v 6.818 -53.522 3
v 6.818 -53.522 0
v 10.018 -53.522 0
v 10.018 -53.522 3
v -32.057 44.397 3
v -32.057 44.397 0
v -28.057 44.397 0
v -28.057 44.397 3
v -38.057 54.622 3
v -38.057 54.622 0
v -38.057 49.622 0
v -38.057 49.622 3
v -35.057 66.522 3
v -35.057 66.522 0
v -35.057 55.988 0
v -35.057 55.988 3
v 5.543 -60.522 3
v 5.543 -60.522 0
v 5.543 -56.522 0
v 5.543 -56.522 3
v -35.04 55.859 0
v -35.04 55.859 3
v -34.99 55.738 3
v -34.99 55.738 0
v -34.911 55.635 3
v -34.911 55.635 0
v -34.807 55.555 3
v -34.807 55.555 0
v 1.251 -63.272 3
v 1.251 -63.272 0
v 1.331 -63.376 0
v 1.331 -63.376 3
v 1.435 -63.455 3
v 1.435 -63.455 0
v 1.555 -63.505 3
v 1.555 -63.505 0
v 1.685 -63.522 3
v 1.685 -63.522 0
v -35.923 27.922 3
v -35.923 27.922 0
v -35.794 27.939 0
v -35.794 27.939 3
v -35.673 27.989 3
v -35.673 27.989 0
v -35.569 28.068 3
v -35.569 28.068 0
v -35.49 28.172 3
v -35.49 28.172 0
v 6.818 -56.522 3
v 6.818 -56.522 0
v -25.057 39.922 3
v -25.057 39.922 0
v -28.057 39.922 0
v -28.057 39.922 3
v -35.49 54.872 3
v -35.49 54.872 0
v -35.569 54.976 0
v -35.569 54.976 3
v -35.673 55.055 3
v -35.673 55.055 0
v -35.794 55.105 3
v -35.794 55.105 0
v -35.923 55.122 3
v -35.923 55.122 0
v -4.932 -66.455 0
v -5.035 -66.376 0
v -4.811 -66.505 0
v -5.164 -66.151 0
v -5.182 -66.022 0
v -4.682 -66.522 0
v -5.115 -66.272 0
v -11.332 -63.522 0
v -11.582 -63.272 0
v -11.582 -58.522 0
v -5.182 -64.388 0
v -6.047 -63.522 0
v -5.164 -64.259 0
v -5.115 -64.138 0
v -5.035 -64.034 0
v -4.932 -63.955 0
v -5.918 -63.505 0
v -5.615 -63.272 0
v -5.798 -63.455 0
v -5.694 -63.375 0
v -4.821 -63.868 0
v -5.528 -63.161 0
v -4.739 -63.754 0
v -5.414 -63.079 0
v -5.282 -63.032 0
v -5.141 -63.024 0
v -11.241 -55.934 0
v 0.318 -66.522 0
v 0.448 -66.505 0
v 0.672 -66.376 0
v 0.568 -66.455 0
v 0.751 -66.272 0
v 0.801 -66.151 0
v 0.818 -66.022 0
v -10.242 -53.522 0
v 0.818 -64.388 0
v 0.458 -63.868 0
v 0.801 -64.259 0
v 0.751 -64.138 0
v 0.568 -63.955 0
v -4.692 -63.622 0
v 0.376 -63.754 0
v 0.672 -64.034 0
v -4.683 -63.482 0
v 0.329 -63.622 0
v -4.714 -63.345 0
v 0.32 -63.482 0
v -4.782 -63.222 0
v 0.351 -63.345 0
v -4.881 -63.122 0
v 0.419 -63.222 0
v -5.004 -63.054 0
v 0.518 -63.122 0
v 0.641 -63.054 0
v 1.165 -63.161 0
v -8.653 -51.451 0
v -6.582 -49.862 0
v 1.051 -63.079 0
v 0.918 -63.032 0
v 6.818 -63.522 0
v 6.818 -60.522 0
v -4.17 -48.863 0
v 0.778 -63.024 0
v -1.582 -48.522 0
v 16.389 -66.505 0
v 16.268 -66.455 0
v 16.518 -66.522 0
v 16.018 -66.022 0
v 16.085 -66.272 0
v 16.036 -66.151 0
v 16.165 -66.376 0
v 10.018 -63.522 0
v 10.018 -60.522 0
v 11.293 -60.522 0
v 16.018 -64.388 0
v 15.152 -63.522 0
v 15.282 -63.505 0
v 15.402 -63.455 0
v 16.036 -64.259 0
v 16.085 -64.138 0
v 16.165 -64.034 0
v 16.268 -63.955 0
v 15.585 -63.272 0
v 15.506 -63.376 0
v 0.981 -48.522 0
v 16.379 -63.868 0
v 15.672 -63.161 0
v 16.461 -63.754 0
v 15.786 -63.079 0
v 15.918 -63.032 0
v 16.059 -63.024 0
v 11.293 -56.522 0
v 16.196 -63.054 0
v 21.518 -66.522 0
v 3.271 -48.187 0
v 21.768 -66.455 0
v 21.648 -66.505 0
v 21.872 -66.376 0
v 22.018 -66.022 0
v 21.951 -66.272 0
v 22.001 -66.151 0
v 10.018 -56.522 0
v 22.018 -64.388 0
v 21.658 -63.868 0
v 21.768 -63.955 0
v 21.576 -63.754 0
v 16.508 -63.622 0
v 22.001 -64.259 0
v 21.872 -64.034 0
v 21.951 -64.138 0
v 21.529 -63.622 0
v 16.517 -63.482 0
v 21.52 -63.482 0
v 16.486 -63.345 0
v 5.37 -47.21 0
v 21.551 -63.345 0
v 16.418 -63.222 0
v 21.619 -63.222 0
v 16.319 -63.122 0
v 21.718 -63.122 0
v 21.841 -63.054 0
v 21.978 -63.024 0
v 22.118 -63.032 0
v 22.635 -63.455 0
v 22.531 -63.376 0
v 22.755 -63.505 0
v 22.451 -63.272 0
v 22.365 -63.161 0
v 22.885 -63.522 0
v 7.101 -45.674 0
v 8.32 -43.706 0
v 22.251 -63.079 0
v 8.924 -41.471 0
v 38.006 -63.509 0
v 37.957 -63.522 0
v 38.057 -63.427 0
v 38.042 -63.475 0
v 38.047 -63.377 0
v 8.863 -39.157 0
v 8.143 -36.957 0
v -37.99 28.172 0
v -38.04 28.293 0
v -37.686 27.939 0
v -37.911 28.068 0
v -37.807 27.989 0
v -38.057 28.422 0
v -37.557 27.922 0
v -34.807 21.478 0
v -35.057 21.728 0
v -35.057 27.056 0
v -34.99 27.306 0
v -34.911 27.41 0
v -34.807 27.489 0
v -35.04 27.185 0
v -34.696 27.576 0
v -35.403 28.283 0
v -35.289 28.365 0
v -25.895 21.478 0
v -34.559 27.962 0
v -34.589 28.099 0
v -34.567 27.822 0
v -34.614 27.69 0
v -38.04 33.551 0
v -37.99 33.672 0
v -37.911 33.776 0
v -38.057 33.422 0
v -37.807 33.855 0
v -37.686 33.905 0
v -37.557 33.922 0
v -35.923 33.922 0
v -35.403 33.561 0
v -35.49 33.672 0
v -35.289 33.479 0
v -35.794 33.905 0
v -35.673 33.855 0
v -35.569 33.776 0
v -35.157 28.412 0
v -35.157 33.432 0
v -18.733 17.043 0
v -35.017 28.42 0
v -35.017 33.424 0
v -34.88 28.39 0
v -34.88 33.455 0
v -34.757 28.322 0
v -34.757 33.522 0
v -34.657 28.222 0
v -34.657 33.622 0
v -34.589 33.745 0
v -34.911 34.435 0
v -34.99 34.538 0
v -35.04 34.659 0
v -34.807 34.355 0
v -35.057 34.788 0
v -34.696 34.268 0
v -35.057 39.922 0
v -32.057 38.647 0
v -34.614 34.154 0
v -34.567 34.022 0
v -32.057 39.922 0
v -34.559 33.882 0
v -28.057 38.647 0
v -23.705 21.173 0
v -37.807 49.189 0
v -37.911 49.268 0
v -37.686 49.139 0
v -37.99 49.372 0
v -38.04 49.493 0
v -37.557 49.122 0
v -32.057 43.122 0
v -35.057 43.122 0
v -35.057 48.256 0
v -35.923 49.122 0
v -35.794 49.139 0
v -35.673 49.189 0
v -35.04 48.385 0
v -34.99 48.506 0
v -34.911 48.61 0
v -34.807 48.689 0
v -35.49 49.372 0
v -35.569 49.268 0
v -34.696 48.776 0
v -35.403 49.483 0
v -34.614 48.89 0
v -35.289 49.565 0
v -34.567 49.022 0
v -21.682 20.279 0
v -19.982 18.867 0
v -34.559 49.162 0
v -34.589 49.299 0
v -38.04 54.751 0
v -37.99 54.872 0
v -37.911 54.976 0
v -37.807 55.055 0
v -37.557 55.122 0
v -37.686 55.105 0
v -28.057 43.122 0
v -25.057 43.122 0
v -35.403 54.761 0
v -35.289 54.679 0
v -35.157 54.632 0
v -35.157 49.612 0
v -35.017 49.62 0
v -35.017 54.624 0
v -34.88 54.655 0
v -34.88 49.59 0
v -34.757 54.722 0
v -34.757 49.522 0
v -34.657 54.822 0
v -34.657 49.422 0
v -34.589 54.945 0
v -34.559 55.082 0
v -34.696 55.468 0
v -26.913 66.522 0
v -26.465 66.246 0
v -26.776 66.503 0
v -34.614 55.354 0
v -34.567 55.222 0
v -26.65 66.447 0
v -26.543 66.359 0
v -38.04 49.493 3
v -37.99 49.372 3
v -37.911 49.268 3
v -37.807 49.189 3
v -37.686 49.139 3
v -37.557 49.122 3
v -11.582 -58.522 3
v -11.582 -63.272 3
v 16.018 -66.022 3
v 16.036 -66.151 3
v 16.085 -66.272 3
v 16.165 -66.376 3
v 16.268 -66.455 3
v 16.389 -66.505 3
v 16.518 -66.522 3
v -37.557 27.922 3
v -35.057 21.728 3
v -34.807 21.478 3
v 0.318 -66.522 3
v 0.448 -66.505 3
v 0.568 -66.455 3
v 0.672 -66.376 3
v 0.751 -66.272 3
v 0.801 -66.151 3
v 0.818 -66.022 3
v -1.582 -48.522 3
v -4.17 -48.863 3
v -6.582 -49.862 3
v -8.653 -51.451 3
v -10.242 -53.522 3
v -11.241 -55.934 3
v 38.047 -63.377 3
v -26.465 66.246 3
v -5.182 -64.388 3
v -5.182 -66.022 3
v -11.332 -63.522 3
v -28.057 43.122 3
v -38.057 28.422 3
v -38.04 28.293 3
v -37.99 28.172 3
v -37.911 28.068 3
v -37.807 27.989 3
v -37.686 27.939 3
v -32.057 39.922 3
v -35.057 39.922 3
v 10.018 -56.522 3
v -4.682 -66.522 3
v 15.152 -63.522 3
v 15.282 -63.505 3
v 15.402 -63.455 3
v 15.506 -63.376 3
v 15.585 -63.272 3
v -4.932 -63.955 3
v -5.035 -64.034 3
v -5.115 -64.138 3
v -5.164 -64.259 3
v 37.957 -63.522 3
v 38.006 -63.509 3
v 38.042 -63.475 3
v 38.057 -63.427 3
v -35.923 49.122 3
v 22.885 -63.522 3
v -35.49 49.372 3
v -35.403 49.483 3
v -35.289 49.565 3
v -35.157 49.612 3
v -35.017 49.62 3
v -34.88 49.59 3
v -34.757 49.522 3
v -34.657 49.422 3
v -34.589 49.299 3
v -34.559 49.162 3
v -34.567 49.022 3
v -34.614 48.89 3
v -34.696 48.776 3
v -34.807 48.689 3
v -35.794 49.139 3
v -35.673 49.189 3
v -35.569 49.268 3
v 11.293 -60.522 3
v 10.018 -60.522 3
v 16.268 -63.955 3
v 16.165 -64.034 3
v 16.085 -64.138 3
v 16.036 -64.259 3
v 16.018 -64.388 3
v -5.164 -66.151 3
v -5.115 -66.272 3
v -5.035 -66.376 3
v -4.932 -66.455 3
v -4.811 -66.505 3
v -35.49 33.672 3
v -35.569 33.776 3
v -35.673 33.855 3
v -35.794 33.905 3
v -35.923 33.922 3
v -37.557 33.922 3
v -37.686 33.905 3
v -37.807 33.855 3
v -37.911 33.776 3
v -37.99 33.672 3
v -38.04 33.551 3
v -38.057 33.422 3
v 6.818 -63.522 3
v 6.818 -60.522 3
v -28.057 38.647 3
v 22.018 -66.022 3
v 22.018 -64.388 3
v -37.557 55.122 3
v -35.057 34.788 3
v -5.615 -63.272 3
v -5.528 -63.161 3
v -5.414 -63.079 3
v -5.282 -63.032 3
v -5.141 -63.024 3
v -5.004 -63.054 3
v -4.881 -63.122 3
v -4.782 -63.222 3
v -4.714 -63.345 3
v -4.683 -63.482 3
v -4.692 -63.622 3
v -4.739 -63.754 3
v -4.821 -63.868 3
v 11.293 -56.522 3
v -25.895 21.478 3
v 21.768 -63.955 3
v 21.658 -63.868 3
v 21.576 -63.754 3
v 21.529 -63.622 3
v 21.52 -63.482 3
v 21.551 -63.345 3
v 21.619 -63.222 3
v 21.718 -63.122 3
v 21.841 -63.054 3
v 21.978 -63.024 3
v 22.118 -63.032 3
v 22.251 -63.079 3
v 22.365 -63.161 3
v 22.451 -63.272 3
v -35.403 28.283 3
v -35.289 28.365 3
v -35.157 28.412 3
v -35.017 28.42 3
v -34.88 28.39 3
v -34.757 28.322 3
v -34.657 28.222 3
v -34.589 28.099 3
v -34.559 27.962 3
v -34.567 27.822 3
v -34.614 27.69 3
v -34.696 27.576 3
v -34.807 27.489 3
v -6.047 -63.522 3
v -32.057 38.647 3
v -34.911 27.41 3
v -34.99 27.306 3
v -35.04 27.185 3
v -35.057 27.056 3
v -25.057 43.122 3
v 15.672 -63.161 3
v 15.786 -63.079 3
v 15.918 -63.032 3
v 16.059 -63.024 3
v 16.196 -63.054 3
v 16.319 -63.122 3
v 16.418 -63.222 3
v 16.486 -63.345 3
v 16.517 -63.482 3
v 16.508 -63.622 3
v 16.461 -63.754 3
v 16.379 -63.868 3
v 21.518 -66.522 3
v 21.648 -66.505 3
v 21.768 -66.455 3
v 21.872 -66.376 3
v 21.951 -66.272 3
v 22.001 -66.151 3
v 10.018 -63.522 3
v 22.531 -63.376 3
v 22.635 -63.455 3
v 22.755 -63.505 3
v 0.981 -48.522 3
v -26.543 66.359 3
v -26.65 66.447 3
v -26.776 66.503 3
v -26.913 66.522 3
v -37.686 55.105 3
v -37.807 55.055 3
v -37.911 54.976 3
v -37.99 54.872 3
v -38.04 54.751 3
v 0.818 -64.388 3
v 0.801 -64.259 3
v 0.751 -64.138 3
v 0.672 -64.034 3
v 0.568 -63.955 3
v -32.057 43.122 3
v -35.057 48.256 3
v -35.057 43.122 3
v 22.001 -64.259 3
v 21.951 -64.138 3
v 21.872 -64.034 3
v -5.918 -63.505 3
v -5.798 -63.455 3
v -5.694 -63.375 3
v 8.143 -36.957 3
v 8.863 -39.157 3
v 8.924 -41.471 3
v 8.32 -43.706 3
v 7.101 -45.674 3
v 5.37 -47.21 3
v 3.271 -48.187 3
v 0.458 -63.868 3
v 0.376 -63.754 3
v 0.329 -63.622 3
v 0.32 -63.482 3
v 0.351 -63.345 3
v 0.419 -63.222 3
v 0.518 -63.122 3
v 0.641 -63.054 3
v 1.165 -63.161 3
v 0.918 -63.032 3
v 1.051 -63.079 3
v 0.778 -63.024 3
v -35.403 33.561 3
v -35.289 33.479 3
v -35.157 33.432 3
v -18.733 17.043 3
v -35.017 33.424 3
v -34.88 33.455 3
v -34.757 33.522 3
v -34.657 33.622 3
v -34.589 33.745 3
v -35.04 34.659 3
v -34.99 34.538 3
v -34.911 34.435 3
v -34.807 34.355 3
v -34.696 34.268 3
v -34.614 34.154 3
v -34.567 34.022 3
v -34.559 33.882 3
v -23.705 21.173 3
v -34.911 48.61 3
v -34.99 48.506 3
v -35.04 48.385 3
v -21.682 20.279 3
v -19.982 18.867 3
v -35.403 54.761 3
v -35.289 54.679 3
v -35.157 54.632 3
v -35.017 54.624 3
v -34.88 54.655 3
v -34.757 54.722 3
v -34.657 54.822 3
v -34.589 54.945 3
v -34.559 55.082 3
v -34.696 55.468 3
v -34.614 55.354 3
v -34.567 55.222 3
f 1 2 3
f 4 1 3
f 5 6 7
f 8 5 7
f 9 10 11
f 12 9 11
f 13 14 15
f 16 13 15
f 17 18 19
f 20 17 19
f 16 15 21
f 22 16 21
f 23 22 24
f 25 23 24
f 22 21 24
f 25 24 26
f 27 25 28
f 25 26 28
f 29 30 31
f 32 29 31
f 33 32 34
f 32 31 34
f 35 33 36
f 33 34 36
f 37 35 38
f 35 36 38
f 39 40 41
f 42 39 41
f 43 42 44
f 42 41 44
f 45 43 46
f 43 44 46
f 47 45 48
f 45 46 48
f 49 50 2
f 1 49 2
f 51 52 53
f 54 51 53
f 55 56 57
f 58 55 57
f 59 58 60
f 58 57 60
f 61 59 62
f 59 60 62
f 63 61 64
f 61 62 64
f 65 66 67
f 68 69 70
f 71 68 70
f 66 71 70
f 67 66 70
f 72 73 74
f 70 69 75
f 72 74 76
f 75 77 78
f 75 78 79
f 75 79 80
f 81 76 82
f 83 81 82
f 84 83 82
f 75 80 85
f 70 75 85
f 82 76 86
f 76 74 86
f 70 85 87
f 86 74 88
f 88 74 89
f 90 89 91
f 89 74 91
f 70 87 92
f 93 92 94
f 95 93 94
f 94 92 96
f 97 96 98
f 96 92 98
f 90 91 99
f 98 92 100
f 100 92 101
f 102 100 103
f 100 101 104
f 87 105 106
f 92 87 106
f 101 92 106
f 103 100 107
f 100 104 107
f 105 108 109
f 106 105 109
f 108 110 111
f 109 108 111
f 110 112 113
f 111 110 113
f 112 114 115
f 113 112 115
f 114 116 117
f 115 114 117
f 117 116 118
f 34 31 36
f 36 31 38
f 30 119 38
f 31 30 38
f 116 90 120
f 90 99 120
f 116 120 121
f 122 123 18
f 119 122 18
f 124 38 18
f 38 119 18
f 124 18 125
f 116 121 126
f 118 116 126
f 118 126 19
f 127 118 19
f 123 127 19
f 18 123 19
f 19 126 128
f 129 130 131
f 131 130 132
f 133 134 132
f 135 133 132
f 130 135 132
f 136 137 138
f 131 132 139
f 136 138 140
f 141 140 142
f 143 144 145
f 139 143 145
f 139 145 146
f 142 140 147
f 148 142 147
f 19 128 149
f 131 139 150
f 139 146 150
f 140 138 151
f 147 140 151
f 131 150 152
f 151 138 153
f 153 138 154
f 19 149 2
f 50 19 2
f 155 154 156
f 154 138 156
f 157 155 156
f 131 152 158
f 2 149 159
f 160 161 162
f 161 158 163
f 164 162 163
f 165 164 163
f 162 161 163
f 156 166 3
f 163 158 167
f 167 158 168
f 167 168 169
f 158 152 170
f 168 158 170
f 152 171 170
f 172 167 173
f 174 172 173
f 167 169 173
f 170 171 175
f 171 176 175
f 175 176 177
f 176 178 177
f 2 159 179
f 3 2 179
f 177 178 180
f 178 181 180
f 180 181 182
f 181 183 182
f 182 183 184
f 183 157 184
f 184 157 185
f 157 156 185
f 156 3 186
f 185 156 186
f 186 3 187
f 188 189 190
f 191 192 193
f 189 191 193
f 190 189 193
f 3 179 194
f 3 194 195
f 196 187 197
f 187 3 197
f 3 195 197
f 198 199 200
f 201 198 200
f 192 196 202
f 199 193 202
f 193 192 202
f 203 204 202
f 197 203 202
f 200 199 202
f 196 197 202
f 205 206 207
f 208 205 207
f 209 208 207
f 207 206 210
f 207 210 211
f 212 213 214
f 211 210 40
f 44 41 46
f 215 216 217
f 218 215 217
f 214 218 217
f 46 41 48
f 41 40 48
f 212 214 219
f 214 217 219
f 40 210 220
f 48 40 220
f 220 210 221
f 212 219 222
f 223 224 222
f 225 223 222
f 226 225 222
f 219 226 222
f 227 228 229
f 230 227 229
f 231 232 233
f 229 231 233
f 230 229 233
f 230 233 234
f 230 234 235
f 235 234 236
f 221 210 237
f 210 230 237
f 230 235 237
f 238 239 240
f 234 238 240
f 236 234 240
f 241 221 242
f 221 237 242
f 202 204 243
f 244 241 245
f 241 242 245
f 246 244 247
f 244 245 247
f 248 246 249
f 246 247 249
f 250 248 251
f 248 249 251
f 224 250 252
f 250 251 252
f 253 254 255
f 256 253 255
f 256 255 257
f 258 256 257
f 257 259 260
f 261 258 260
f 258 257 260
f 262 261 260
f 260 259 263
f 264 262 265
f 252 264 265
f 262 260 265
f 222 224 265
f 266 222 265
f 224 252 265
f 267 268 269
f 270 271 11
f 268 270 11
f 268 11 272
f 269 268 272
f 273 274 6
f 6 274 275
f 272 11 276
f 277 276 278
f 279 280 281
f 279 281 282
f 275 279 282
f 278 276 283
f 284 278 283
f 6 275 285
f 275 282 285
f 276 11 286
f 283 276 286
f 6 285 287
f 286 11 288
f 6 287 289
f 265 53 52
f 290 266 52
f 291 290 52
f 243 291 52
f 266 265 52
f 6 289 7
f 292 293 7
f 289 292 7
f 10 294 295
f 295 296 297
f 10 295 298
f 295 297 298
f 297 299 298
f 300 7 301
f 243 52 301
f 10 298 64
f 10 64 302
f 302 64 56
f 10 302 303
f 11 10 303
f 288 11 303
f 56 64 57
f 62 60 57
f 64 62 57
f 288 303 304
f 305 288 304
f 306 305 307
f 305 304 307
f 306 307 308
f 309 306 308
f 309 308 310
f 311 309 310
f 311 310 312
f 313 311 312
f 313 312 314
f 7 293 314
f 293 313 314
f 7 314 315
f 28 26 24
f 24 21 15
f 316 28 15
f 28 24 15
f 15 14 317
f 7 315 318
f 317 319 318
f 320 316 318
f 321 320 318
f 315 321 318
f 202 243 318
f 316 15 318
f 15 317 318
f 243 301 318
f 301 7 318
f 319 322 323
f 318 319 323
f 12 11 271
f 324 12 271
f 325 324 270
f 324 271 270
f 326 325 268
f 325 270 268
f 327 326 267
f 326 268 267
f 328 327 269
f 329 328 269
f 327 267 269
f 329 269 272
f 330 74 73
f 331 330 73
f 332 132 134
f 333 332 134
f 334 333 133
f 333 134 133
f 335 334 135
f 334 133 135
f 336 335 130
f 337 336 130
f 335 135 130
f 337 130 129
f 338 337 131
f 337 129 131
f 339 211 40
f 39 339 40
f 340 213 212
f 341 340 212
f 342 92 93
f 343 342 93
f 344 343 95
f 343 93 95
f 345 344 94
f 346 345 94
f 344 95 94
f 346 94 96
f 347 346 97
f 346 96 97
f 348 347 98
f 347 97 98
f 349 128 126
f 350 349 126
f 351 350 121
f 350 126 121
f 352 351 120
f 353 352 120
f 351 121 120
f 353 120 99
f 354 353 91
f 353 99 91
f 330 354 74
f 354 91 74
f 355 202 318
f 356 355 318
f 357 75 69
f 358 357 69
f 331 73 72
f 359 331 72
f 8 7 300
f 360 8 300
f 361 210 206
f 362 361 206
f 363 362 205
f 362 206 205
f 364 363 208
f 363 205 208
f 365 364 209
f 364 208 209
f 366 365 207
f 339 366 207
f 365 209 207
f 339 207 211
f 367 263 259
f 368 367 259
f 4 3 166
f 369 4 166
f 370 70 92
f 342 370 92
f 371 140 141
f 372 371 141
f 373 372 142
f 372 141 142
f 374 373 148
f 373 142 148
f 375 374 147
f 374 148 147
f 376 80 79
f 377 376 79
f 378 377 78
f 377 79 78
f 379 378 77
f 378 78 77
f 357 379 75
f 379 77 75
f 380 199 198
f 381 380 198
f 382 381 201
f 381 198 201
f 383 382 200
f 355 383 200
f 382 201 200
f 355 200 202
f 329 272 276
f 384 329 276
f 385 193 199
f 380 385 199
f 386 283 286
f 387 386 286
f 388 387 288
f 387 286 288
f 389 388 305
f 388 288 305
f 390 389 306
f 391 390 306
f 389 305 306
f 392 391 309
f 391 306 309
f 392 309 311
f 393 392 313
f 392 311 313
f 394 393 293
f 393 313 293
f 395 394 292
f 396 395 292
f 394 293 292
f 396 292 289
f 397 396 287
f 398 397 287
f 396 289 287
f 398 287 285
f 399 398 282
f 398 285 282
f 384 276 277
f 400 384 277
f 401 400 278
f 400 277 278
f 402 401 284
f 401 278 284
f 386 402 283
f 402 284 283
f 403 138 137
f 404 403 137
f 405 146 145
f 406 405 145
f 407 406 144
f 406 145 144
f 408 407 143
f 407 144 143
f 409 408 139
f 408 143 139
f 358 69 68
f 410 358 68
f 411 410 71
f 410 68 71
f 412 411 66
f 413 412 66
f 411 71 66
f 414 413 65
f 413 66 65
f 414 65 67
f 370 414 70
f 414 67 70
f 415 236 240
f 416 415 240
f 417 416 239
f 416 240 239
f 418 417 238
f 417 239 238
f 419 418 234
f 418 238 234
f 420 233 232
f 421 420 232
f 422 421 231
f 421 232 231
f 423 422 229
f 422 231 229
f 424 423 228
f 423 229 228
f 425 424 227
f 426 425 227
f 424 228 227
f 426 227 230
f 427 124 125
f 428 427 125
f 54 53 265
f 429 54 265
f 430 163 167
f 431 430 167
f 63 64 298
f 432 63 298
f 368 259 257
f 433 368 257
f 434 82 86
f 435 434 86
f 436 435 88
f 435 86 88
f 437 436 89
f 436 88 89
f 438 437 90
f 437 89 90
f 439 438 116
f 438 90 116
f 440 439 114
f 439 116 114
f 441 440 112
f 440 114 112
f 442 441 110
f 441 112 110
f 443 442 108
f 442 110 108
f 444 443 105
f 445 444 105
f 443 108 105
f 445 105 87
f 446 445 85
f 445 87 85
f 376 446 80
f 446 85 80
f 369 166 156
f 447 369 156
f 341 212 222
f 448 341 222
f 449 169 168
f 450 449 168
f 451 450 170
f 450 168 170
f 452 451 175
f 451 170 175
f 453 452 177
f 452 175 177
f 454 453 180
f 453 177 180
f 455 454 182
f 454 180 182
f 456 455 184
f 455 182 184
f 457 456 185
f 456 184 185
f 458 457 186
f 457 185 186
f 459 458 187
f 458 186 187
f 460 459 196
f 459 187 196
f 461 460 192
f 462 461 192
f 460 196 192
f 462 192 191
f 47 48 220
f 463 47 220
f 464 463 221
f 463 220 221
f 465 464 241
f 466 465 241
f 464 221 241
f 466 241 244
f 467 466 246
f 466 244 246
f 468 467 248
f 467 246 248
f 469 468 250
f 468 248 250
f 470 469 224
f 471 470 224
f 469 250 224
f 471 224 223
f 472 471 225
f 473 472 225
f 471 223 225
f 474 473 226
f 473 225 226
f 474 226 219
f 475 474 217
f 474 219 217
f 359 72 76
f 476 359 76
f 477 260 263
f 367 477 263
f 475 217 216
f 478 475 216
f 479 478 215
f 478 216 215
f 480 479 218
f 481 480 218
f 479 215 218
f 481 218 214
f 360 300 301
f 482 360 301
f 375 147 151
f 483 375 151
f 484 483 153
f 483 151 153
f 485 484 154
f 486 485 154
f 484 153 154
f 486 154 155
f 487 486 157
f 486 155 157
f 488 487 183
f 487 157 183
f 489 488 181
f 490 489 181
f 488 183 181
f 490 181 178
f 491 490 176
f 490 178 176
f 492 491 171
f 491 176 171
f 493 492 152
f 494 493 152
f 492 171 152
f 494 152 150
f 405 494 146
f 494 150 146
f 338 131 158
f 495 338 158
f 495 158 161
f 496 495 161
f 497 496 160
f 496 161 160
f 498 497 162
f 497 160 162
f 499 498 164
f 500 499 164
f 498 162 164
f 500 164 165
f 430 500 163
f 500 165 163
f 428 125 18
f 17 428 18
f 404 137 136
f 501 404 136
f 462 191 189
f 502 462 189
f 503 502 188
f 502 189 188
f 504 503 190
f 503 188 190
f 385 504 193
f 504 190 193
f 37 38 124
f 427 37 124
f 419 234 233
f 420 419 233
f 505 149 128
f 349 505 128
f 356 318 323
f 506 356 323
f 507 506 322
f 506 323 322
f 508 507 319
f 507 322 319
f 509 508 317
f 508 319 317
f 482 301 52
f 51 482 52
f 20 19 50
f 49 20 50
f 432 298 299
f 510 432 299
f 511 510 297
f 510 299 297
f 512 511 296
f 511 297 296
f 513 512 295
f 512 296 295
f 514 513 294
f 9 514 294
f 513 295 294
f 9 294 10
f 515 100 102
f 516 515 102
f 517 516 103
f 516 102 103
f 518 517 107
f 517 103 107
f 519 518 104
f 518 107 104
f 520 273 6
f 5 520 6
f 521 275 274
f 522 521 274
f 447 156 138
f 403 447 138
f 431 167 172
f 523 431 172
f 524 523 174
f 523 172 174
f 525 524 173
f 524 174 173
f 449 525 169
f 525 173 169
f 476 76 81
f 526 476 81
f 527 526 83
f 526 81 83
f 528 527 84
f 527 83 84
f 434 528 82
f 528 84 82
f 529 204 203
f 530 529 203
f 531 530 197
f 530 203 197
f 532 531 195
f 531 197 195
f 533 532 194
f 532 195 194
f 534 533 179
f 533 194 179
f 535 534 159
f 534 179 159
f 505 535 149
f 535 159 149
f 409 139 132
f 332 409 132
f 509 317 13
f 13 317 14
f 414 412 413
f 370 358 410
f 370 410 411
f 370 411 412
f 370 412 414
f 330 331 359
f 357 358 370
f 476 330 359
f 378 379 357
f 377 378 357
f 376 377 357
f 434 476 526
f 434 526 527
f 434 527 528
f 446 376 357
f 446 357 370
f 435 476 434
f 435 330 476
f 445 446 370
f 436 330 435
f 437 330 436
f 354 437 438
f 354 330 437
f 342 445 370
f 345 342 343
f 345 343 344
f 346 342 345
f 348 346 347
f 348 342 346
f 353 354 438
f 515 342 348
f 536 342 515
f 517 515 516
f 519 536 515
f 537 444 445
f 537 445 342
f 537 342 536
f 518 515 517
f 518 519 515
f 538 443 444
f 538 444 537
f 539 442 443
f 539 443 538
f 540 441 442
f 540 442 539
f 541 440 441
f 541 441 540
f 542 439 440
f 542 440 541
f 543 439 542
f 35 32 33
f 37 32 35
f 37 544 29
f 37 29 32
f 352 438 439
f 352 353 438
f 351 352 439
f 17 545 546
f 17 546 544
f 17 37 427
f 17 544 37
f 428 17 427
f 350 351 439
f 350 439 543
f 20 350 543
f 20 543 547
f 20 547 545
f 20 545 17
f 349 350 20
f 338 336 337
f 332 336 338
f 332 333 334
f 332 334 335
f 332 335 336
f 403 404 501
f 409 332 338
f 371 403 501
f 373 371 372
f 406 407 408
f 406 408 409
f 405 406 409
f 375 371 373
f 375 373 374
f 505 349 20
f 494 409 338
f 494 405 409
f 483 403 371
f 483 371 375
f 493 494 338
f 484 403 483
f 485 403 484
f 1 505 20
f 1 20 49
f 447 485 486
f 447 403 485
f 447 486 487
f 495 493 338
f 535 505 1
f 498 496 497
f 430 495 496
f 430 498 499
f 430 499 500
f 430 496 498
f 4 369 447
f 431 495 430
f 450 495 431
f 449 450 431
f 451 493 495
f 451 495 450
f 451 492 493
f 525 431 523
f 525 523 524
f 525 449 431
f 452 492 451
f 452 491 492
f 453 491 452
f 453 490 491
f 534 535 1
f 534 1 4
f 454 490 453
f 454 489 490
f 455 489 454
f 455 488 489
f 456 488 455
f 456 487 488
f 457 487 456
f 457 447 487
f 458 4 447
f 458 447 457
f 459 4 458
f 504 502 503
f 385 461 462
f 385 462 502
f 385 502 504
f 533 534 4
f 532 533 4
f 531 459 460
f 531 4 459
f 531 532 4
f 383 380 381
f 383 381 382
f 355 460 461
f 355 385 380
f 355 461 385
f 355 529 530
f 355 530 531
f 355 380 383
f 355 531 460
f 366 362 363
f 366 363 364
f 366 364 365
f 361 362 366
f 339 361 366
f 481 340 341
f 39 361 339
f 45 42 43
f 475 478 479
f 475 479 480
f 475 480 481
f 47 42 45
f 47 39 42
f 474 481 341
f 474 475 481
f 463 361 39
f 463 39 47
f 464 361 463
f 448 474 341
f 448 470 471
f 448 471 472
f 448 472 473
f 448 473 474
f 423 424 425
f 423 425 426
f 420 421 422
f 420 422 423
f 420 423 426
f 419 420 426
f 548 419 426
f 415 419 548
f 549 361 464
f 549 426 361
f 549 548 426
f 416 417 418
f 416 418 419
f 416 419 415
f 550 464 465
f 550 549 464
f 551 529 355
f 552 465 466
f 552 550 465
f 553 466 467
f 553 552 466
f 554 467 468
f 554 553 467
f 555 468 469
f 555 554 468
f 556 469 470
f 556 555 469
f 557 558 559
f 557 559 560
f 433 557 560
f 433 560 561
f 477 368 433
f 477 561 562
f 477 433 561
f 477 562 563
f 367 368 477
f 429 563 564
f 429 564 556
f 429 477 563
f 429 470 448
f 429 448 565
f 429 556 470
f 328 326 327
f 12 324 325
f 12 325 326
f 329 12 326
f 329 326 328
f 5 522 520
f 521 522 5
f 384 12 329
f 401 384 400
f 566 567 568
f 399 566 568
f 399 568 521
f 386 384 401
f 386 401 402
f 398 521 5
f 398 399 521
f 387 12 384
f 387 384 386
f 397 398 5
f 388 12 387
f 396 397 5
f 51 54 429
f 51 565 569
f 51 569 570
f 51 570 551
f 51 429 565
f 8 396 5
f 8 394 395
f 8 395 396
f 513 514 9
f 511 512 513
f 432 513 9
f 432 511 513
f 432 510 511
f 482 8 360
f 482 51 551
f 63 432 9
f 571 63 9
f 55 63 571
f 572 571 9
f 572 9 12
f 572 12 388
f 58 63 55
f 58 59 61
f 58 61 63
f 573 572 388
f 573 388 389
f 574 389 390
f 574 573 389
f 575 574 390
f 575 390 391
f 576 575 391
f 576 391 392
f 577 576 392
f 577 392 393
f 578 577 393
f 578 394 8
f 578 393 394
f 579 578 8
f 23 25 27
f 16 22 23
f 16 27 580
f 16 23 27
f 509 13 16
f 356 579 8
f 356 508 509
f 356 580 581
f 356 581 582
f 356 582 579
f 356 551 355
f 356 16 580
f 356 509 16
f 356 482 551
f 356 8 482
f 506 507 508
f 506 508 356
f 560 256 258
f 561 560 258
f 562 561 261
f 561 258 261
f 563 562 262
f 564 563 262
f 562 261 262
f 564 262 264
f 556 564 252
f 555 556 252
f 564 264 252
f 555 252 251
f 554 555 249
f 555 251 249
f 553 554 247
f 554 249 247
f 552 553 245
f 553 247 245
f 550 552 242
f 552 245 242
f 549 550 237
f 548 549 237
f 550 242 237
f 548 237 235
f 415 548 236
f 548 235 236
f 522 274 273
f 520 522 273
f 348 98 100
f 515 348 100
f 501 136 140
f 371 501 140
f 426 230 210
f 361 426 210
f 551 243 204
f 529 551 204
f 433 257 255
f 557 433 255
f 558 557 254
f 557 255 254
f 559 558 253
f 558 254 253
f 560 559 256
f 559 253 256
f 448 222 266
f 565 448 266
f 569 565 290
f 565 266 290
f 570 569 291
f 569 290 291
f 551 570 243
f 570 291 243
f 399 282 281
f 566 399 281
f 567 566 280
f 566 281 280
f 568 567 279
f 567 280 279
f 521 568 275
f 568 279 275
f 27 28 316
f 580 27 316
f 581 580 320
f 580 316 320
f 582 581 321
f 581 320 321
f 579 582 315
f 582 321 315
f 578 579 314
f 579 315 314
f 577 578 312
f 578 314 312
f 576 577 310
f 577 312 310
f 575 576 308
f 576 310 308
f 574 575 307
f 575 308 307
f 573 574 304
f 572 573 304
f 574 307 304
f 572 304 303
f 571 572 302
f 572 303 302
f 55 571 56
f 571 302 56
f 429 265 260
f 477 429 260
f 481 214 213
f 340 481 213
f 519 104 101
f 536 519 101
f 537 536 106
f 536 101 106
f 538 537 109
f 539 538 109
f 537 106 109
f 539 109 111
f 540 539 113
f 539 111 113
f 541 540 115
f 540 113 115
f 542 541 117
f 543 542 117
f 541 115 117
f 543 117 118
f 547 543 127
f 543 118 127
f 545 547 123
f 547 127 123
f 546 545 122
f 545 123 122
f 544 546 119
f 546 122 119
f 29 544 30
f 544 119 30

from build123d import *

# Parameters (mm, degrees)
F1_DEPTH = 3


# Not quite as in the source:
# - ends of sketch curves that miss each other by under 0.0002 mm in the source are joined


with BuildPart() as f1:
    # F0 (on Top) → F1 (new body)
    with BuildSketch(Plane.XY):
        with BuildLine():
            Line((-11.331514, -63.521951), (-6.04749, -63.521951))
            ThreePointArc((-6.04749, -63.521951), (-5.797538527, -63.4549610061), (-5.6145259066, -63.2719490539))
            ThreePointArc((-5.6145259066, -63.2719490539), (-4.8279591264, -63.1683980924), (-4.9315131291, -63.9549637764))
            ThreePointArc((-4.9315131291, -63.9549637764), (-5.1145256646, -64.1379759355), (-5.181513, -64.387976))
            Line((-5.181513, -64.387976), (-5.181517, -66.022003))
            ThreePointArc((-5.181517, -66.022003), (-5.0350703906, -66.3755563906), (-4.681517, -66.522003))
            Line((-4.681517, -66.522003), (0.318481, -66.522003))
            ThreePointArc((0.318481, -66.522003), (0.6720343906, -66.3755563906), (0.818481, -66.022003))
            Line((0.818481, -66.022003), (0.818481, -64.387974))
            ThreePointArc((0.818481, -64.387974), (0.7514940061, -64.137974527), (0.5684820539, -63.9549619066))
            ThreePointArc((0.5684820539, -63.9549619066), (0.4649300924, -63.1683971264), (1.2514957764, -63.2719511291))
            ThreePointArc((1.2514957764, -63.2719511291), (1.4345099355, -63.4549636646), (1.68451, -63.521951))
            Line((1.68451, -63.521951), (6.818481, -63.521951))
            Line((6.818481, -63.521951), (6.818481, -60.521979))
            Line((6.818481, -60.521979), (5.543485, -60.521979))
            Line((5.543485, -60.521979), (5.543485, -56.521951))
            Line((5.543485, -56.521951), (6.818481, -56.521951))
            Line((6.818481, -56.521951), (6.818481, -53.521951))
            Line((6.818481, -53.521951), (10.018491, -53.521951))
            Line((10.018491, -53.521951), (10.018491, -56.521951))
            Line((10.018491, -56.521951), (11.293485, -56.521951))
            Line((11.293485, -56.521951), (11.293485, -60.521979))
            Line((11.293485, -60.521979), (10.018491, -60.521979))
            Line((10.018491, -60.521979), (10.018491, -63.521951))
            Line((10.018491, -63.521951), (15.152465, -63.521948))
            ThreePointArc((15.152465, -63.521948), (15.4024642565, -63.4549611311), (15.5854768434, -63.2719494869))
            ThreePointArc((15.5854768434, -63.2719494869), (16.3720418736, -63.1683980924), (16.2684878709, -63.9549637764))
            ThreePointArc((16.2684878709, -63.9549637764), (16.0854743354, -64.1379759355), (16.018487, -64.387976))
            Line((16.018487, -64.387976), (16.018484, -66.022003))
            ThreePointArc((16.018484, -66.022003), (16.1649306094, -66.3755563906), (16.518484, -66.522003))
            Line((16.518484, -66.522003), (21.518482, -66.522003))
            ThreePointArc((21.518482, -66.522003), (21.8720353906, -66.3755563906), (22.018482, -66.022003))
            Line((22.018482, -66.022003), (22.018482, -64.387974))
            ThreePointArc((22.018482, -64.387974), (21.9514952226, -64.137974902), (21.7684838039, -63.9549623396))
            ThreePointArc((21.7684838039, -63.9549623396), (21.6649320924, -63.1683971264), (22.4514977764, -63.2719511291))
            ThreePointArc((22.4514977764, -63.2719511291), (22.634510152, -63.4549637896), (22.88451, -63.521951))
            Line((22.88451, -63.521951), (37.957041, -63.521951))
            ThreePointArc((37.957041, -63.521951), (38.0420573761, -63.4746028356), (38.0465663652, -63.3773953159))
            Line((38.0465663652, -63.3773953159), (-26.465295, 66.24561))
            ThreePointArc((-26.465295, 66.24561), (-26.6496426342, 66.4473285217), (-26.912508, 66.522003))
            Line((-26.912508, 66.522003), (-35.056991, 66.522003))
            Line((-35.056991, 66.522003), (-35.056987, 55.98807))
            ThreePointArc((-35.056987, 55.98807), (-34.9900000061, 55.738070527), (-34.8069880539, 55.5550579066))
            ThreePointArc((-34.8069880539, 55.5550579066), (-34.7034372218, 54.768492997), (-35.4900025264, 54.8720466961))
            ThreePointArc((-35.4900025264, 54.8720466961), (-35.6730149355, 55.0550596646), (-35.923015, 55.122047))
            Line((-35.923015, 55.122047), (-37.557041, 55.12205))
            ThreePointArc((-37.557041, 55.12205), (-37.9105943906, 54.9756033906), (-38.057041, 54.62205))
            Line((-38.057041, 54.62205), (-38.057041, 49.622052))
            ThreePointArc((-38.057041, 49.622052), (-37.9105943906, 49.2684986094), (-37.557041, 49.122052))
            Line((-37.557041, 49.122052), (-35.923013, 49.122052))
            ThreePointArc((-35.923013, 49.122052), (-35.673013527, 49.1890389939), (-35.4900009066, 49.3720509461))
            ThreePointArc((-35.4900009066, 49.3720509461), (-34.7034359497, 49.4756017309), (-34.8069901291, 48.6890362236))
            ThreePointArc((-34.8069901291, 48.6890362236), (-34.9900026646, 48.5060240645), (-35.05699, 48.256024))
            Line((-35.05699, 48.256024), (-35.05699, 43.122054))
            Line((-35.05699, 43.122054), (-32.057018, 43.122054))
            Line((-32.057018, 43.122054), (-32.057018, 44.397048))
            Line((-32.057018, 44.397048), (-28.05699, 44.397048))
            Line((-28.05699, 44.397048), (-28.05699, 43.122054))
            Line((-28.05699, 43.122054), (-25.05699, 43.122054))
            Line((-25.05699, 43.122054), (-25.05699, 39.922043))
            Line((-25.05699, 39.922043), (-28.05699, 39.922043))
            Line((-28.05699, 39.922043), (-28.05699, 38.647048))
            Line((-28.05699, 38.647048), (-32.057018, 38.647048))
            Line((-32.057018, 38.647048), (-32.057018, 39.922043))
            Line((-32.057018, 39.922043), (-35.05699, 39.922043))
            Line((-35.05699, 39.922043), (-35.056987, 34.788071))
            ThreePointArc((-35.056987, 34.788071), (-34.9900000061, 34.538071527), (-34.8069880539, 34.3550589066))
            ThreePointArc((-34.8069880539, 34.3550589066), (-34.7034372218, 33.568492997), (-35.4900025264, 33.6720466961))
            ThreePointArc((-35.4900025264, 33.6720466961), (-35.6730149355, 33.8550596646), (-35.923015, 33.922047))
            Line((-35.923015, 33.922047), (-37.557041, 33.92205))
            ThreePointArc((-37.557041, 33.92205), (-37.9105943906, 33.7756033906), (-38.057041, 33.42205))
            Line((-38.057041, 33.42205), (-38.057041, 28.422053))
            ThreePointArc((-38.057041, 28.422053), (-37.9105943906, 28.0684996094), (-37.557041, 27.922053))
            Line((-37.557041, 27.922053), (-35.923013, 27.922053))
            ThreePointArc((-35.923013, 27.922053), (-35.673013527, 27.9890399939), (-35.4900009066, 28.1720519461))
            ThreePointArc((-35.4900009066, 28.1720519461), (-34.7034359497, 28.2756027309), (-34.8069901291, 27.4890372236))
            ThreePointArc((-34.8069901291, 27.4890372236), (-34.9900026646, 27.3060250645), (-35.05699, 27.056025))
            Line((-35.05699, 27.056025), (-35.05699, 21.728049))
            Line((-35.05699, 21.728049), (-34.80699, 21.478049))
            Line((-34.80699, 21.478049), (-25.894542, 21.478049))
            ThreePointArc((-25.894542, 21.478049), (-21.6823966253, 20.2793600017), (-18.7325143305, 17.0425068355))
            Line((-18.7325143305, 17.0425068355), (8.142657, -36.957493))
            ThreePointArc((8.142657, -36.957493), (7.781941119, -44.7340961853), (0.98063, -48.521951))
            Line((0.98063, -48.521951), (-1.581514, -48.521951))
            ThreePointArc((-1.581514, -48.521951), (-8.6525818119, -51.4508831881), (-11.581514, -58.521951))
            Line((-11.581514, -58.521951), (-11.581514, -63.271951))
            Line((-11.581514, -63.271951), (-11.331514, -63.521951))
        make_face()
    extrude(amount=F1_DEPTH)


solid = f1.part
